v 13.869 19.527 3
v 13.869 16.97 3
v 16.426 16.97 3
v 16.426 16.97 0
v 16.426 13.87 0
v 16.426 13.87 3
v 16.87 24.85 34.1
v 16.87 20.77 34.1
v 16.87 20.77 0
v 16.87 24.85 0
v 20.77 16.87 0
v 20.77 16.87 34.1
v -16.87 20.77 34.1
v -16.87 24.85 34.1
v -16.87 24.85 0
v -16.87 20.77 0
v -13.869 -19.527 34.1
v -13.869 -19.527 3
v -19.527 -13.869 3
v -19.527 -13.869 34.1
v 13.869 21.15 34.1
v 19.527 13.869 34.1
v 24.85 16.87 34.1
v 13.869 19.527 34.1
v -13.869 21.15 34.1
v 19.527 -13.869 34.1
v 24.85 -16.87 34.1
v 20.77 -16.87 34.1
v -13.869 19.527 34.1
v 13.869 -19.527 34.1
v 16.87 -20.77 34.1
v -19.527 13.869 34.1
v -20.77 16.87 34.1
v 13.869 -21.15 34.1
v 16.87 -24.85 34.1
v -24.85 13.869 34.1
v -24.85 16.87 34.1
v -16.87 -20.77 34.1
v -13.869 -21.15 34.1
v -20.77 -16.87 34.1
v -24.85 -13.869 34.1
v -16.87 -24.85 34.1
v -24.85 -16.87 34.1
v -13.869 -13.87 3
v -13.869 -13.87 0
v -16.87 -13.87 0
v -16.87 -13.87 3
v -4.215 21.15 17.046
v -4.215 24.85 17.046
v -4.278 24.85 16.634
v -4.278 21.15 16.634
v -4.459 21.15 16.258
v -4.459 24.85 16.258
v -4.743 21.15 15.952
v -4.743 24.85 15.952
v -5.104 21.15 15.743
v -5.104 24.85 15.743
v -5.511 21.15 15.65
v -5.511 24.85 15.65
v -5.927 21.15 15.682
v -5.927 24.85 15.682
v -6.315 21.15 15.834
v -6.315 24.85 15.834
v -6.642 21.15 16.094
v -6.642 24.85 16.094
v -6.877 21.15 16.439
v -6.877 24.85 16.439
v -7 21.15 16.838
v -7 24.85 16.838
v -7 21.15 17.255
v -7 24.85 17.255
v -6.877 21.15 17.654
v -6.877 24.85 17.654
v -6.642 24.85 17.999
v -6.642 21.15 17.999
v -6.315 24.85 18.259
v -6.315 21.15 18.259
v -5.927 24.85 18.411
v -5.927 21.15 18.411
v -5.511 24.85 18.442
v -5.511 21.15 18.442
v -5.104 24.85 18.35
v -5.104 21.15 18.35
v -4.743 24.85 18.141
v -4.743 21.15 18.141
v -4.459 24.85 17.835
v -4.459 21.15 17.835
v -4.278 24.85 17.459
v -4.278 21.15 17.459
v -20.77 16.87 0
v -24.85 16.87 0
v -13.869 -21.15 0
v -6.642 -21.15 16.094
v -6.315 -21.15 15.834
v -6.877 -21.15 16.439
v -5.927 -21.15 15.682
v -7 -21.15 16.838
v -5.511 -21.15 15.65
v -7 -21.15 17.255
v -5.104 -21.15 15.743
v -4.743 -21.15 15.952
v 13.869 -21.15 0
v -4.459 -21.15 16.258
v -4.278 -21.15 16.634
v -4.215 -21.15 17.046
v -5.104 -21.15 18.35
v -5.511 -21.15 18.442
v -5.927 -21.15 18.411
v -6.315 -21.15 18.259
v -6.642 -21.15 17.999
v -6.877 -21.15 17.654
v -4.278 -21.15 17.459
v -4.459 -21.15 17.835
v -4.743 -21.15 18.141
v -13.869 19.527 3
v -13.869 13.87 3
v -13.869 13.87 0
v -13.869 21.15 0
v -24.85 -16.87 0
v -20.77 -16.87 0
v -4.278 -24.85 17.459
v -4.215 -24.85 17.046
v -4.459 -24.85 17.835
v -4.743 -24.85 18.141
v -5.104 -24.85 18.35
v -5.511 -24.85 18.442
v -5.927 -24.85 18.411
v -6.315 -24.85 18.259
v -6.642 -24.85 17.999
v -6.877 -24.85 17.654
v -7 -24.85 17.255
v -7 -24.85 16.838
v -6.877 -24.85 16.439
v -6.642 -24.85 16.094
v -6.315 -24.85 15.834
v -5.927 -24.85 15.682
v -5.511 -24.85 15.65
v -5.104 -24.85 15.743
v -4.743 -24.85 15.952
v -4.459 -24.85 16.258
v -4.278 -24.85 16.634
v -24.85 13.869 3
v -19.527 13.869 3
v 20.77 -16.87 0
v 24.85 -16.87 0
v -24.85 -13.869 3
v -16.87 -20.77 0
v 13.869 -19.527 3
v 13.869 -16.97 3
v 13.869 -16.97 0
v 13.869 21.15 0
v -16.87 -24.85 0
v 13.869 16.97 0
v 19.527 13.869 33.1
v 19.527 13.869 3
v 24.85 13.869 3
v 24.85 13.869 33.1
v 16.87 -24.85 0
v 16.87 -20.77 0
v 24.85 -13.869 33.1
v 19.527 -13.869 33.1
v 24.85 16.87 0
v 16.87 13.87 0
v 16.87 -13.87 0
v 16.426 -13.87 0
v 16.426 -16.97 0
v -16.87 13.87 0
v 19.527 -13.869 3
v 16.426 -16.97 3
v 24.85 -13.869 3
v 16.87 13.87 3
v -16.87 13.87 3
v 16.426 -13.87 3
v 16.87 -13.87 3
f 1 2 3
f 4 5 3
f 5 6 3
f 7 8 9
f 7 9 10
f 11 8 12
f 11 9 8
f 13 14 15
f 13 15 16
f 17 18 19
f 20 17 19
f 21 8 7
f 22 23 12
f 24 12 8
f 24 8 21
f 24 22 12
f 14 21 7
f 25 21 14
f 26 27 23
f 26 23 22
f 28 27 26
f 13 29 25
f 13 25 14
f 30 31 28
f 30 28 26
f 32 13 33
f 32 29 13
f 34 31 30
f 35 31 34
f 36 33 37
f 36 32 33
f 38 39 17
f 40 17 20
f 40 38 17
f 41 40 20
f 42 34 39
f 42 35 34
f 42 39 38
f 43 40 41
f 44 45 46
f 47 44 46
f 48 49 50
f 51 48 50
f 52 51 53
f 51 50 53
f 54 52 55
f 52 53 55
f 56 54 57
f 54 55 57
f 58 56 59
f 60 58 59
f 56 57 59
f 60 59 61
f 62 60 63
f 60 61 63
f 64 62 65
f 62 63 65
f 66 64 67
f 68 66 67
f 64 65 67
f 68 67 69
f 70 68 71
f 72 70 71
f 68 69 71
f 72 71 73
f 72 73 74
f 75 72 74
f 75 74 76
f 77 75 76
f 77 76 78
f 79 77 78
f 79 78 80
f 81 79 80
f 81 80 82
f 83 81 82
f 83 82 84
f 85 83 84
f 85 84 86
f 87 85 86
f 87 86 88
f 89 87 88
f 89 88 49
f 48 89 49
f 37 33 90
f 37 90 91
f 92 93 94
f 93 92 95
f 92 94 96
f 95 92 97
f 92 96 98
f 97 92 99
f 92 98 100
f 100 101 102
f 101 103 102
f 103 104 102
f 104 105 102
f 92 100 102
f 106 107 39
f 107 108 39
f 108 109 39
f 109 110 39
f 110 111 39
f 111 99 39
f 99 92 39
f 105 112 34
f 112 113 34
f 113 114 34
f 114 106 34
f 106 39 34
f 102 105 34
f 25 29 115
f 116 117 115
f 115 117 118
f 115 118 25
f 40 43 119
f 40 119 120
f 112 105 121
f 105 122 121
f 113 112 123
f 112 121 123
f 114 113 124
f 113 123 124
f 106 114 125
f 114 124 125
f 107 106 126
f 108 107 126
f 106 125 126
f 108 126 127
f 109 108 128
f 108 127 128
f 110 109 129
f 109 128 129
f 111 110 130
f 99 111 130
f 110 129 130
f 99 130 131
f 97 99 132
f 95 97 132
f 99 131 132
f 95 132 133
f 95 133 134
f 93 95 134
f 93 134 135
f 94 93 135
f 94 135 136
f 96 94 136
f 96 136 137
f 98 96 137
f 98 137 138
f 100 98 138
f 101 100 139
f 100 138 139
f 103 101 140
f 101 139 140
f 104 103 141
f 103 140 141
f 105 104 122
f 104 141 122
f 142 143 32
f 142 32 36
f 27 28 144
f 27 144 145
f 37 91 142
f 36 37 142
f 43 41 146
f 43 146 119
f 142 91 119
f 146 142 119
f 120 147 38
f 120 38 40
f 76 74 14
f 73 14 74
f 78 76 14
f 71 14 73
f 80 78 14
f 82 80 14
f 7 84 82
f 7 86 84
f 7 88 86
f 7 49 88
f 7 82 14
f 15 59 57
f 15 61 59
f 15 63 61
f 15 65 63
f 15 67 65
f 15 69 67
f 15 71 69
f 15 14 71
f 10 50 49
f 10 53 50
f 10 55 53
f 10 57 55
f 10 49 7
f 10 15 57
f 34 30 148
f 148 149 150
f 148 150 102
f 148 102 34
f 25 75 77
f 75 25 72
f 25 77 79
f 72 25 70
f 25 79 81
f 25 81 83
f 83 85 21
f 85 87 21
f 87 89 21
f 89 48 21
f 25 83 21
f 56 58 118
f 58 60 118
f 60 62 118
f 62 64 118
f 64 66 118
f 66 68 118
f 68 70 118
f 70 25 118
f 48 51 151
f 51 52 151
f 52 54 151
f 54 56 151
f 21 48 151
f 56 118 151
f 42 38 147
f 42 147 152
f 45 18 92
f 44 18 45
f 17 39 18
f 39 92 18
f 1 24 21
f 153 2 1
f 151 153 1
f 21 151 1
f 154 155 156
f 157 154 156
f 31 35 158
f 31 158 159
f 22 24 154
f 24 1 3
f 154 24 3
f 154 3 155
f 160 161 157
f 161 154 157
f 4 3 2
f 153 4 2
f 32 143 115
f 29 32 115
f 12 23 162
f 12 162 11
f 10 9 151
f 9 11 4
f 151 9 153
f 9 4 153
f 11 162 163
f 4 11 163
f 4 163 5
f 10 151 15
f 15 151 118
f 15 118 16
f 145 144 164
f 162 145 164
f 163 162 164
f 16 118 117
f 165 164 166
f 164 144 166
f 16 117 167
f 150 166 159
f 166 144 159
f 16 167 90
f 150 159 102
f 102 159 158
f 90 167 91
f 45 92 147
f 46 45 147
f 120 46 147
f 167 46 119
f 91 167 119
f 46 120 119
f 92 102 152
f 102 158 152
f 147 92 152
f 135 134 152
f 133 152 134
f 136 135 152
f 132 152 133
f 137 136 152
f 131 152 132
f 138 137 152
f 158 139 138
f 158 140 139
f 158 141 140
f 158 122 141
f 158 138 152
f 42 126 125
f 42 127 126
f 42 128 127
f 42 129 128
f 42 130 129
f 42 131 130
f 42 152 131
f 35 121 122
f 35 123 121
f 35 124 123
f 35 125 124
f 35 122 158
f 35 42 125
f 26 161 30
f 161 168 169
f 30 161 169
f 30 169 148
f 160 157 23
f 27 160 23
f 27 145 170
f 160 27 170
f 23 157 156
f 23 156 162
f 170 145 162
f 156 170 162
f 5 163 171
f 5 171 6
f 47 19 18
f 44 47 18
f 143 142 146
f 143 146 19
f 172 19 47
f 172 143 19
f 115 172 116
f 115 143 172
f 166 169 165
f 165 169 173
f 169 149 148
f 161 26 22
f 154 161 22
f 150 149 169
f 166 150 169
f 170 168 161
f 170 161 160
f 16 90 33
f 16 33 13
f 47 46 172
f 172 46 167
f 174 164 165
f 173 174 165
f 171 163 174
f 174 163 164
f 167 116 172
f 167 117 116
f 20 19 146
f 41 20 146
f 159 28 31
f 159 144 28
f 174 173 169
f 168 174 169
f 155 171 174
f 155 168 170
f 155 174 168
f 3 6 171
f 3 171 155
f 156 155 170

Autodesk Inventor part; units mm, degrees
ref_plane "Work Plane1" through (0, 0, 0) normal (0, 0, 1) x (1, 0, 0)
sketch "Sketch1" plane through (0, 0, 0) normal (0, 0, 1) x (1, 0, 0)
  arc A0 (12.5934, -5.8404) -> (12.8401, -5.9947) centre (12.8241, -5.7459) ccw construction
  line L0 (12.8401, -5.9947) -> (16.4715, -5.9947) construction
  line L1 (16.4715, -5.9947) -> (16.97, -5.4961) construction
  line L2 (16.97, -5.4961) -> (16.97, 1.583) construction
  arc A1 (16.97, 2.3806) -> (16.97, 1.583) centre (17.2691, 1.9818) ccw construction
  line L3 (16.97, 2.3806) -> (16.97, 5.4715) construction
  line L4 (16.97, 5.4715) -> (16.4715, 5.97) construction
  line L5 (16.4715, 5.97) -> (12.8401, 5.97) construction
  arc A2 (12.8401, 5.97) -> (12.6094, 5.8152) centre (12.8401, 5.7207) ccw construction
  arc A3 (12.0954, 5.2394) -> (12.6094, 5.8152) centre (11.5075, 6.2814) ccw construction
  arc A4 (12.0954, 5.2394) -> (11.974, 5.0466) centre (12.2223, 5.0248) ccw construction
  line L6 (11.974, 5.0466) -> (11.9439, 4.702) construction
  arc A5 (11.6955, 4.4744) -> (11.9439, 4.702) centre (11.6955, 4.7237) ccw construction
  line L7 (11.6955, 4.4744) -> (11.2445, 4.4744) construction
  arc A6 (10.9961, 4.702) -> (11.2445, 4.4744) centre (11.2445, 4.7237) ccw construction
  line L8 (10.9961, 4.702) -> (10.9642, 5.0674) construction
  arc A7 (10.9642, 5.0674) -> (10.8487, 5.2566) centre (10.7158, 5.0457) ccw construction
  arc A8 (10.3792, 5.8152) -> (10.8487, 5.2566) centre (11.4862, 6.2691) ccw construction
  arc A9 (10.3792, 5.8152) -> (10.1485, 5.97) centre (10.1485, 5.7206) ccw construction
  line L9 (10.1485, 5.97) -> (9.4685, 5.97) construction
  line L10 (9.4685, 5.97) -> (8.97, 5.4715) construction
  line L11 (8.97, 5.4715) -> (8.97, -5.4961) construction
  line L12 (8.97, -5.4961) -> (9.4685, -5.9947) construction
  line L13 (9.4685, -5.9947) -> (10.1412, -5.9947) construction
  arc A10 (10.1412, -5.9947) -> (10.3791, -5.84) centre (10.1485, -5.7455) ccw construction
  arc A11 (10.8487, -5.2813) -> (10.3791, -5.84) centre (11.4862, -6.2938) ccw construction
  arc A12 (10.8487, -5.2813) -> (10.9642, -5.0921) centre (10.7158, -5.0704) ccw construction
  line L14 (10.9642, -5.0921) -> (10.9961, -4.7266) construction
  arc A13 (11.2445, -4.4991) -> (10.9961, -4.7266) centre (11.2445, -4.7483) ccw construction
  line L15 (11.2445, -4.4991) -> (11.6955, -4.4991) construction
  arc A14 (11.9439, -4.7266) -> (11.6955, -4.4991) centre (11.6955, -4.7483) ccw construction
  line L16 (11.9439, -4.7266) -> (11.974, -5.0712) construction
  arc A15 (11.974, -5.0712) -> (12.0954, -5.264) centre (12.2223, -5.0495) ccw construction
  arc A16 (12.5934, -5.8404) -> (12.0954, -5.264) centre (11.4862, -6.2938) ccw construction
  arc A17 (24.85, 22.85) -> (22.85, 24.85) centre (22.85, 22.85) ccw construction
  line L17 (22.85, 24.85) -> (-16.97, 24.85) construction
  line L18 (-16.97, 24.85) -> (-16.97, 21.15) construction
  line L19 (-16.97, 21.15) -> (16.97, 21.15) construction
  line L20 (16.97, 16.97) -> (16.97, 21.15) construction
  line L21 (21.15, 16.97) -> (16.97, 16.97) construction
  line L22 (21.15, 16.97) -> (21.15, -16.97) construction
  line L23 (21.15, -16.97) -> (24.85, -16.97) construction
  line L24 (24.85, -16.97) -> (24.85, 22.85) construction
  line L25 (23.75, 23.25) -> (23.75, 18.15) construction
  arc A18 (23.25, 17.65) -> (23.75, 18.15) centre (23.25, 18.15) ccw construction
  line L26 (23.25, 17.65) -> (20.8937, 17.65) construction
  arc A19 (20.5239, 17.8134) -> (20.8937, 17.65) centre (20.8937, 18.15) ccw construction
  line L27 (20.5239, 17.8134) -> (17.7803, 20.8273) construction
  arc A20 (17.65, 21.1639) -> (17.7803, 20.8273) centre (18.15, 21.1639) ccw construction
  line L28 (17.65, 21.1639) -> (17.65, 23.25) construction
  arc A21 (18.15, 23.75) -> (17.65, 23.25) centre (18.15, 23.25) ccw construction
  line L29 (18.15, 23.75) -> (23.25, 23.75) construction
  arc A22 (23.75, 23.25) -> (23.25, 23.75) centre (23.25, 23.25) ccw construction
  arc A23 (-24.85, -22.85) -> (-22.85, -24.85) centre (-22.85, -22.85) ccw construction
  line L30 (-22.85, -24.85) -> (16.97, -24.85) construction
  line L31 (16.97, -24.85) -> (16.97, -21.15) construction
  line L32 (16.97, -21.15) -> (-16.97, -21.15) construction
  line L33 (-16.97, -16.97) -> (-16.97, -21.15) construction
  line L34 (-21.15, -16.97) -> (-16.97, -16.97) construction
  line L35 (-21.15, -16.97) -> (-21.15, 16.97) construction
  line L36 (-21.15, 16.97) -> (-24.85, 16.97) construction
  line L37 (-24.85, 16.97) -> (-24.85, -22.85) construction
  line L38 (-20.8273, -17.7803) -> (-17.8134, -20.5239) construction
  arc A24 (-17.65, -20.8937) -> (-17.8134, -20.5239) centre (-18.15, -20.8937) ccw construction
  line L39 (-17.65, -20.8937) -> (-17.65, -23.25) construction
  arc A25 (-18.15, -23.75) -> (-17.65, -23.25) centre (-18.15, -23.25) ccw construction
  line L40 (-18.15, -23.75) -> (-23.25, -23.75) construction
  arc A26 (-23.75, -23.25) -> (-23.25, -23.75) centre (-23.25, -23.25) ccw construction
  line L41 (-23.75, -23.25) -> (-23.75, -18.15) construction
  arc A27 (-23.25, -17.65) -> (-23.75, -18.15) centre (-23.25, -18.15) ccw construction
  line L42 (-23.25, -17.65) -> (-21.1639, -17.65) construction
  arc A28 (-20.8273, -17.7803) -> (-21.1639, -17.65) centre (-21.1639, -18.15) ccw construction
  arc A29 (-22.85, 24.85) -> (-24.85, 22.85) centre (-22.85, 22.85) ccw construction
  line L43 (-22.85, 24.85) -> (16.97, 24.85) construction
  line L44 (16.97, 24.85) -> (16.97, 21.15) construction
  line L45 (16.97, 21.15) -> (-16.97, 21.15) construction
  line L46 (-16.97, 16.97) -> (-16.97, 21.15) construction
  line L47 (-21.15, 16.97) -> (-16.97, 16.97) construction
  line L48 (-21.15, 16.97) -> (-21.15, -16.97) construction
  line L49 (-21.15, -16.97) -> (-24.85, -16.97) construction
  line L50 (-24.85, -16.97) -> (-24.85, 22.85) construction
  line L51 (-20.8273, 17.7803) -> (-17.8134, 20.5239) construction
  arc A30 (-17.8134, 20.5239) -> (-17.65, 20.8937) centre (-18.15, 20.8937) ccw construction
  line L52 (-17.65, 20.8937) -> (-17.65, 23.25) construction
  arc A31 (-17.65, 23.25) -> (-18.15, 23.75) centre (-18.15, 23.25) ccw construction
  line L53 (-18.15, 23.75) -> (-23.25, 23.75) construction
  arc A32 (-23.25, 23.75) -> (-23.75, 23.25) centre (-23.25, 23.25) ccw construction
  line L54 (-23.75, 23.25) -> (-23.75, 18.15) construction
  arc A33 (-23.75, 18.15) -> (-23.25, 17.65) centre (-23.25, 18.15) ccw construction
  line L55 (-23.25, 17.65) -> (-21.1639, 17.65) construction
  arc A34 (-21.1639, 17.65) -> (-20.8273, 17.7803) centre (-21.1639, 18.15) ccw construction
  arc A35 (22.85, -24.85) -> (24.85, -22.85) centre (22.85, -22.85) ccw construction
  line L56 (22.85, -24.85) -> (-16.97, -24.85) construction
  line L57 (-16.97, -24.85) -> (-16.97, -21.15) construction
  line L58 (-16.97, -21.15) -> (16.97, -21.15) construction
  line L59 (16.97, -16.97) -> (16.97, -21.15) construction
  line L60 (21.15, -16.97) -> (16.97, -16.97) construction
  line L61 (21.15, -16.97) -> (21.15, 16.97) construction
  line L62 (21.15, 16.97) -> (24.85, 16.97) construction
  line L63 (24.85, 16.97) -> (24.85, -22.85) construction
  line L64 (23.75, -23.25) -> (23.75, -18.15) construction
  arc A36 (23.75, -18.15) -> (23.25, -17.65) centre (23.25, -18.15) ccw construction
  line L65 (23.25, -17.65) -> (20.8937, -17.65) construction
  arc A37 (20.8937, -17.65) -> (20.5239, -17.8134) centre (20.8937, -18.15) ccw construction
  line L66 (20.5239, -17.8134) -> (17.7803, -20.8273) construction
  arc A38 (17.7803, -20.8273) -> (17.65, -21.1639) centre (18.15, -21.1639) ccw construction
  line L67 (17.65, -21.1639) -> (17.65, -23.25) construction
  arc A39 (17.65, -23.25) -> (18.15, -23.75) centre (18.15, -23.25) ccw construction
  line L68 (18.15, -23.75) -> (23.25, -23.75) construction
  arc A40 (23.25, -23.75) -> (23.75, -23.25) centre (23.25, -23.25) ccw construction
  circle A41 centre (0.47, -10.47) radius 1.1 construction
  circle A42 centre (0.47, 12.53) radius 1.025 construction
  line L69 (24.85, 16.87) -> (16.87, 16.87)
  line L70 (16.87, 16.87) -> (16.87, -16.87)
  line L71 (16.87, -16.87) -> (24.85, -16.87)
  line L72 (24.85, -16.87) -> (24.85, 16.87)
  line L73 (-16.87, 24.85) -> (16.87, 24.85)
  line L74 (16.87, 24.85) -> (16.87, 13.87)
  line L75 (16.87, 13.87) -> (-16.87, 13.87)
  line L76 (-16.87, 13.87) -> (-16.87, 24.85)
  line L77 (-16.87, 16.87) -> (-24.85, 16.87)
  line L78 (-24.85, 16.87) -> (-24.85, -16.87)
  line L79 (-24.85, -16.87) -> (-16.87, -16.87)
  line L80 (-16.87, -16.87) -> (-16.87, 16.87)
  line L81 (-16.87, -24.85) -> (16.87, -24.85)
  line L82 (16.87, -24.85) -> (16.87, -13.87)
  line L83 (16.87, -13.87) -> (-16.87, -13.87)
  line L84 (-16.87, -13.87) -> (-16.87, -24.85)
  point P0 (0, 0)
extrude "Extrusion1" add sketch "Sketch1" along normal blind 3 contours L72 L71 L70 L69 | L70 L75 L76 L73 L74 | L82 L81 L84 L80 L83 L70 | L80 L79 L78 L77 L76
chamfer "Chamfer1" distance 3.9 angle 45 4 edges at (16.87, -16.87, 1.5) (-16.87, -16.87, 1.5) (-16.87, 16.87, 1.5) (16.87, 16.87, 1.5)
sketch "Sketch2" plane through (0, 0, 3) normal (0, 0, 1) x (1, 0, 0)
  line L0 (-16.87, -13.87) -> (-16.87, 13.87) projected
  line L1 (-16.87, 13.87) -> (16.87, 13.87) projected
  line L2 (16.87, 13.87) -> (16.87, -13.87) projected
  line L3 (16.87, -13.87) -> (-16.87, -13.87) projected
  line L4 (-16.87, -20.77) -> (-16.87, -24.85) projected
  line L5 (-16.87, -24.85) -> (16.87, -24.85) projected
  line L6 (16.87, -24.85) -> (16.87, -20.77) projected
  line L7 (20.77, -16.87) -> (16.87, -20.77) projected
  line L8 (20.77, -16.87) -> (24.85, -16.87) projected
  line L9 (24.85, -16.87) -> (24.85, 16.87) projected
  line L10 (24.85, 16.87) -> (20.77, 16.87) projected
  line L11 (16.87, 20.77) -> (20.77, 16.87) projected
  line L12 (16.87, 20.77) -> (16.87, 24.85) projected
  line L13 (16.87, 24.85) -> (-16.87, 24.85) projected
  line L14 (-16.87, 24.85) -> (-16.87, 20.77) projected
  line L15 (-20.77, 16.87) -> (-16.87, 20.77) projected
  line L16 (-20.77, 16.87) -> (-24.85, 16.87) projected
  line L17 (-24.85, 16.87) -> (-24.85, -16.87) projected
  line L18 (-24.85, -16.87) -> (-20.77, -16.87) projected
  line L19 (-16.87, -20.77) -> (-20.77, -16.87) projected
  line L20 (13.8689, -19.5269) -> (13.8689, -21.8489)
  line L21 (-13.8689, -21.8489) -> (-13.8689, -19.5269)
  line L22 (-13.8689, -19.5269) -> (-19.5269, -13.8689)
  line L23 (-19.5269, -13.8689) -> (-21.8489, -13.8689)
  line L24 (-21.8489, 13.8689) -> (-19.5269, 13.8689)
  line L25 (-19.5269, 13.8689) -> (-13.8689, 19.5269)
  line L26 (-13.8689, 19.5269) -> (-13.8689, 21.8489)
  line L27 (13.8689, 21.8489) -> (13.8689, 19.5269)
  line L28 (13.8689, 19.5269) -> (19.5269, 13.8689)
  line L29 (19.5269, 13.8689) -> (21.8489, 13.8689)
  line L30 (21.8489, -13.8689) -> (19.5269, -13.8689)
  line L31 (19.5269, -13.8689) -> (13.8689, -19.5269)
  line L32 (13.8689, -21.8489) -> (13.8689, -24.85)
  line L33 (16.87, -24.85) -> (-16.87, -24.85) projected
  line L34 (21.8489, -13.8689) -> (24.85, -13.8689)
  line L35 (24.85, -16.87) -> (24.85, 16.87) projected
  line L36 (21.8489, 13.8689) -> (24.85, 13.8689)
  line L37 (13.8689, 21.8489) -> (13.8689, 24.85)
  line L38 (-13.8689, 21.8489) -> (-13.8689, 24.85)
  line L39 (-21.8489, 13.8689) -> (-24.85, 13.8689)
  line L40 (-21.8489, -13.8689) -> (-24.85, -13.8689)
  line L41 (-13.8689, -21.8489) -> (-13.8689, -24.85)
  line L42 (13.8689, -21.8489) -> (11.5469, -21.8489)
  line L43 (-11.5469, -21.8489) -> (-13.8689, -21.8489)
  line L44 (21.8489, 13.8689) -> (21.8489, 11.5469)
  line L45 (21.8489, -11.5469) -> (21.8489, -13.8689)
  line L46 (-21.8489, -13.8689) -> (-21.8489, -11.5469)
  line L47 (-21.8489, 11.5469) -> (-21.8489, 13.8689)
  line L48 (-13.8689, 21.8489) -> (-11.5469, 21.8489)
  line L49 (11.5469, 21.8489) -> (13.8689, 21.8489)
  point P0 (0, 0)
  dimension "d13" = 3.0011
ref_plane "Work Plane2" through (-16.97, -24.85, 34.1) normal (0, 0, -1) x (0, 1, 0)
extrude "Extrusion2" add sketch "Sketch2" along normal up to surface (31.1 mm away) contours L32 L20 L31 L30 L34 L9 L8 L7 L6 L5
pattern_circular "Circular Pattern1" count 4 over 360 about axis through (0, 0, 17.13) along (0, 0, -1) of "Extrusion2"
sketch "Sketch3" plane through (-24.85, -13.8689, 34.1) normal (0, 0, 1) x (1, 0, 0)
  circle A0 centre (13.82, 14.8989) radius 1.5 projected
  line L0 (10.9811, -5.658) -> (5.3231, 0) projected
  line L1 (5.3231, 0) -> (0, 0) projected
  line L2 (0, 0) -> (0, -3.0011) projected
  line L3 (0, -3.0011) -> (4.08, -3.0011) projected
  line L4 (4.08, -3.0011) -> (7.98, -6.9011) projected
  line L5 (7.98, -6.9011) -> (7.98, -10.9811) projected
  line L6 (7.98, -10.9811) -> (10.9811, -10.9811) projected
  line L7 (10.9811, -10.9811) -> (10.9811, -5.658) projected
  line L8 (5.3231, 27.7378) -> (10.9811, 33.3958) projected
  line L9 (10.9811, 33.3958) -> (10.9811, 38.7189) projected
  line L10 (10.9811, 38.7189) -> (7.98, 38.7189) projected
  line L11 (7.98, 38.7189) -> (7.98, 34.6389) projected
  line L12 (7.98, 34.6389) -> (4.08, 30.7389) projected
  line L13 (4.08, 30.7389) -> (0, 30.7389) projected
  line L14 (0, 30.7389) -> (0, 27.7378) projected
  line L15 (0, 27.7378) -> (5.3231, 27.7378) projected
  line L16 (10.9811, -10.9811) -> (16.9811, -10.9811)
  line L17 (16.9811, 38.7189) -> (10.9811, 38.7189)
  line L18 (0, 0) -> (0, 27.7378)
  line L19 (0, 0) -> (5.3231, 0)
  line L20 (5.3231, 0) -> (5.3231, 27.7378)
  line L21 (5.3231, 27.7378) -> (0, 27.7378)
  line L22 (0, 27.7378) -> (0, 0)
  line L23 (5.3231, 0) -> (0, 0) projected
  line L24 (5.3231, 0) -> (10.9811, -5.658)
  line L25 (10.9811, 33.3958) -> (5.3231, 27.7378)
  line L26 (38.7189, 38.7189) -> (38.7189, 33.3958) projected
  line L27 (38.7189, -5.658) -> (38.7189, -10.9811) projected
  line L28 (10.9811, -10.9811) -> (38.7189, -10.9811)
  line L29 (38.7189, -10.9811) -> (38.7189, -5.658)
  line L30 (38.7189, -5.658) -> (10.9811, -5.658)
  line L31 (10.9811, -5.658) -> (10.9811, -10.9811)
  line L32 (10.9811, 38.7189) -> (10.9811, 33.3958) projected
  line L33 (10.9811, 38.7189) -> (38.7189, 38.7189)
  line L34 (38.7189, 38.7189) -> (38.7189, 33.3958)
  line L35 (38.7189, 33.3958) -> (10.9811, 33.3958)
  line L36 (10.9811, 33.3958) -> (10.9811, 38.7189)
  line L37 (16.9811, -10.9811) -> (16.9811, -5.658)
  line L38 (16.9811, 33.3958) -> (16.9811, 38.7189)
  line L39 (10.9811, 38.7189) -> (10.9811, 33.3958)
  line L40 (10.9811, -5.658) -> (10.9811, -10.9811)
  line L41 (10.9811, -5.658) -> (10.9811, 0)
  line L42 (10.9811, 27.7378) -> (10.9811, 33.3958)
  line L43 (49.7, 0) -> (44.3769, 0) projected
  line L44 (44.3769, 27.7378) -> (49.7, 27.7378) projected
  line L45 (44.3769, 27.7378) -> (49.7, 27.7378)
  line L46 (49.7, 27.7378) -> (49.7, 0)
  line L47 (49.7, 0) -> (44.3769, 0)
  line L48 (44.3769, 0) -> (44.3769, 27.7378)
  point P0 (24.85, 13.8689)
  dimension "d19" = 6
extrude "Extrusion3" add sketch "Sketch3" against normal blind 1 contours L7 L6 L5 L4 L3 L2 L1 L0 | L15 L14 L13 L12 L11 L10 L9 L8 | L43 L48 L44 L46
sketch "Sketch4" plane through (24.85, -16.87, 0) normal (1, 0, 0) x (0, 0, -1)
  line L0 (37.9, 11.3739) -> (37.9, 18.453) construction
  line L1 (23.6194, 18.453) -> (37.9, 18.453) construction
  arc A0 (22.1806, 18.453) -> (23.6194, 18.453) centre (22.9, 16.8577) ccw construction
  line L2 (-1.3806, 18.453) -> (22.1806, 18.453) construction
  arc A1 (-2.8194, 18.453) -> (-1.3806, 18.453) centre (-2.1, 16.8577) ccw construction
  line L3 (-31.3806, 18.453) -> (-2.8194, 18.453) construction
  arc A2 (-32.8194, 18.453) -> (-31.3806, 18.453) centre (-32.1, 16.8577) ccw construction
  line L4 (-42.1, 18.453) -> (-32.8194, 18.453) construction
  line L5 (-42.1, 11.3739) -> (-42.1, 18.453) construction
  line L6 (-42.1, 11.3739) -> (37.9, 11.3739) construction
  line L7 (37.9, 19.2506) -> (37.9, 22.3415) construction
  line L8 (-42.1, 22.3415) -> (37.9, 22.3415) construction
  line L9 (-42.1, 19.2506) -> (-42.1, 22.3415) construction
  line L10 (-42.1, 19.2506) -> (37.9, 19.2506) construction
  line L11 (-3, 3.0011) -> (-3, 30.7389) construction
  line L12 (-34.1, 33.84) -> (-34.1, -5.98) construction
  line L13 (-3, 11.3739) -> (-34.1, 11.3739)
  line L14 (-34.1, 11.3739) -> (-34.1, 22.3415)
  line L15 (-34.1, 22.3415) -> (-3, 22.3415)
  line L16 (-3, 22.3415) -> (-3, 11.3739)
  line L17 (-34.1, 11.3739) -> (-32.1, 11.3739)
  line L18 (-32.1, 11.3739) -> (-32.1, 3.0011)
  line L19 (-32.1, 3.0011) -> (-34.1, 3.0011)
  line L20 (-34.1, 3.0011) -> (-34.1, 11.3739)
  line L21 (-34.1, 22.3415) -> (-32.1, 22.3415)
  line L22 (-32.1, 22.3415) -> (-32.1, 30.7389)
  line L23 (-32.1, 30.7389) -> (-34.1, 30.7389)
  line L24 (-34.1, 30.7389) -> (-34.1, 22.3415)
  point P0 (0, 16.87)
  dimension "d24" = 2
ref_plane "Work Plane3" through (16.97, -5.4961, -37.9) normal (1, 0, 0) x (0, 1, 0)
sketch "Sketch7" plane through (0, 0, 0) normal (0, 0, -1) x (-1, 0, 0)
  arc A0 (18.93, 12.43) -> (22.43, 8.93) centre (22.43, 12.43) ccw construction
  line L0 (18.93, 12.43) -> (18.93, 14.53) construction
  line L1 (3.13, 14.53) -> (18.93, 14.53) construction
  line L2 (3.13, 14.53) -> (3.13, 12.43) construction
  arc A1 (-0.37, 8.93) -> (3.13, 12.43) centre (-0.37, 12.43) ccw construction
  line L3 (-0.37, 8.93) -> (-2.47, 8.93) construction
  line L4 (-2.47, -6.87) -> (-2.47, 8.93) construction
  line L5 (-2.47, -6.87) -> (-0.37, -6.87) construction
  arc A2 (3.13, -10.37) -> (-0.37, -6.87) centre (-0.37, -10.37) ccw construction
  line L6 (3.13, -10.37) -> (3.13, -12.47) construction
  line L7 (18.93, -12.47) -> (3.13, -12.47) construction
  line L8 (18.93, -12.47) -> (18.93, -10.37) construction
  arc A3 (22.43, -6.87) -> (18.93, -10.37) centre (22.43, -10.37) ccw construction
  line L9 (22.43, -6.87) -> (24.53, -6.87) construction
  line L10 (24.53, 8.93) -> (24.53, -6.87) construction
  line L11 (24.53, 8.93) -> (22.43, 8.93) construction
  circle A4 centre (11.03, 1.03) radius 2.5 construction
  arc A5 (-1.5344, 11.2045) -> (0.934, 13.4886) centre (-0.47, 12.53) ccw construction
  circle A6 centre (-0.47, -10.47) radius 1.1 construction
  arc A7 (0.5944, 13.8555) -> (-1.874, 11.5714) centre (-0.47, 12.53) ccw construction
  line L12 (-19.5269, -13.8689) -> (-24.85, -13.8689) construction
  line L13 (-16.87, 13.87) -> (-16.87, -13.87) construction
  line L14 (-16.87, -13.87) -> (16.87, -13.87) construction
  line L15 (16.87, -13.87) -> (16.87, 13.87) construction
  line L16 (16.87, 13.87) -> (-16.87, 13.87) construction
  line L17 (-19.5269, 13.8689) -> (-13.8689, 19.5269) construction
  line L18 (-13.8689, 19.5269) -> (-13.8689, 24.85) construction
  line L19 (-13.8689, 24.85) -> (13.8689, 24.85) construction
  line L20 (13.8689, 24.85) -> (13.8689, 19.5269) construction
  line L21 (13.8689, 19.5269) -> (19.5269, 13.8689) construction
  line L22 (19.5269, 13.8689) -> (24.85, 13.8689) construction
  line L23 (24.85, 13.8689) -> (24.85, -13.8689) construction
  line L24 (24.85, -13.8689) -> (19.5269, -13.8689) construction
  line L25 (19.5269, -13.8689) -> (13.8689, -19.5269) construction
  line L26 (13.8689, -19.5269) -> (13.8689, -24.85) construction
  line L27 (13.8689, -24.85) -> (-13.8689, -24.85) construction
  line L28 (-13.8689, -24.85) -> (-13.8689, -19.5269) construction
  line L29 (-13.8689, -19.5269) -> (-19.5269, -13.8689) construction
  line L30 (16.87, 13.87) -> (-16.87, 13.87) construction
  line L31 (16.87, 13.87) -> (-19.5258, 13.87) projected
  line L32 (-2.13, 13.87) -> (16.87, 13.87)
  line L33 (16.87, 13.87) -> (16.87, -16.45)
  line L34 (16.87, -16.45) -> (-2.13, -16.45)
  line L35 (-2.13, -16.45) -> (-2.13, 13.87)
  line L36 (16.97, 16.97) -> (-16.97, 16.97)
  line L37 (16.87, 13.87) -> (-2.13, 13.87)
  line L38 (-2.13, 13.87) -> (-2.13, 16.45)
  line L39 (-2.13, 16.45) -> (16.87, 16.45)
  line L40 (16.87, 16.45) -> (16.87, 13.87)
  line L41 (-16.97, -16.97) -> (16.97, -16.97) construction
  line L42 (-24.85, -13.8689) -> (-24.85, 13.8689) projected
  line L43 (-24.85, 13.8689) -> (-19.5269, 13.8689) projected
  point P0 (0, 0)
  dimension "d35" = 19
  dimension "d36" = 0
  dimension "d74" = 16.45
  dimension "d75" = 16.45
ref_plane "Work Plane4" through (-25.03, -12.97, -12) normal (0, 0, 1) x (1, 0, 0)
sketch "Sketch14" plane through (-16.87, 24.85, 0) normal (0, 1, 0) x (1, 0, 0)
  line L0 (3.0011, -3) -> (3.0011, -34.1) projected
  line L1 (30.7389, -3) -> (3.0011, -3) projected
  line L2 (30.7389, -3) -> (30.7389, -34.1) projected
  line L3 (33.74, -34.1) -> (30.7389, -34.1) projected
  line L4 (33.74, 0) -> (33.74, -34.1) projected
  line L5 (33.74, 0) -> (0, 0) projected
  line L6 (0, 0) -> (0, -34.1) projected
  line L7 (3.0011, -34.1) -> (0, -34.1) projected
  line L8 (3.0011, -3) -> (3.0011, -34.1) projected
  line L9 (30.7389, -34.1) -> (36.3969, -34.1) projected
  line L10 (3.0011, -3) -> (30.7389, -3)
  line L11 (30.7389, -3) -> (30.7389, -34.1)
  line L12 (30.7389, -34.1) -> (3.0011, -34.1)
  line L13 (3.0011, -34.1) -> (3.0011, -3)
  circle A0 centre (11.8112, -17.0464) radius 1.4 construction
  circle A1 centre (11.2546, -17.0464) radius 1.4
  point P0 (16.87, 0)
  dimension "d89" = 2.8
extrude "Extrusion12" add sketch "Sketch14" against normal up to surface (3.7 mm away) contours L1 L2 L12 L0
sketch "Sketch15" plane through (0, 0, 3) normal (0, 0, 1) x (1, 0, 0)
  line L0 (19.5269, 13.8689) -> (13.8689, 19.5269) projected
  line L1 (2.2647, -16.97) -> (16.4258, -16.97)
  line L2 (16.4258, -16.97) -> (16.4258, 16.97)
  line L3 (16.4258, 16.97) -> (2.2647, 16.97)
  line L4 (2.2647, 16.97) -> (2.2647, -16.97)
  line L5 (2.2647, -16.97) -> (16.4258, 16.97) construction
  line L6 (16.4258, -16.97) -> (2.2647, 16.97) construction
  line L7 (13.8689, -24.85) -> (13.8689, -19.5269) projected
  line L8 (13.8689, -19.5269) -> (19.5269, -13.8689) projected
  line L9 (19.5269, -13.8689) -> (24.85, -13.8689) projected
  line L10 (24.85, -13.8689) -> (24.85, 13.8689) projected
  line L11 (16.87, 13.87) -> (16.87, -13.87) projected
  line L12 (16.87, -13.87) -> (-16.87, -13.87) projected
  line L13 (-16.87, -13.87) -> (-16.87, 13.87) projected
  line L14 (-16.87, 13.87) -> (16.87, 13.87) projected
  line L15 (24.85, 13.8689) -> (19.5269, 13.8689) projected
  line L16 (19.5269, 13.8689) -> (13.8689, 19.5269) projected
  line L17 (13.8689, 19.5269) -> (13.8689, 21.15) projected
  line L18 (-13.8689, 21.15) -> (-13.8689, 19.5269) projected
  line L19 (-13.8689, 19.5269) -> (-19.5269, 13.8689) projected
  line L20 (-19.5269, 13.8689) -> (-24.85, 13.8689) projected
  line L21 (-24.85, 13.8689) -> (-24.85, -13.8689) projected
  line L22 (-24.85, -13.8689) -> (-19.5269, -13.8689) projected
  line L23 (-19.5269, -13.8689) -> (-13.8689, -19.5269) projected
  line L24 (-13.8689, -19.5269) -> (-13.8689, -24.85) projected
  line L25 (13.8689, 19.5269) -> (13.8689, -19.5269)
  line L26 (16.87, 24.85) -> (-16.87, 24.85) projected
  line L27 (-13.8689, -19.5269) -> (-19.5269, -13.8689) projected
  line L28 (-13.8689, -19.5269) -> (-13.8689, 19.5269)
  line L29 (13.8689, 21.15) -> (-13.8689, 21.15) projected
  line L30 (-13.8689, -24.85) -> (13.8689, -24.85) projected
  point P0 (0, 0)
  point P1 (9.3452, 0)
extrude "Extrusion13" cut sketch "Sketch15" against normal through all contours L2 L14 L25 L3 | L25 L3 L4 L14 L28 L18 L29 L17 | L2 L12 L25 L14 | L25 L14 L4 L3 | L2 L1 L25 L12 | L25 L12 L4 L14 | L25 L1 L4 L12 | L4 L12 L28 L14 | L25 L7 L30 L24 L28 L12 L4 L1
sketch "Sketch16" plane through (13.8689, -24.85, 0) normal (0, -1, 0) x (1, 0, 0)
  circle A0 centre (-19.4843, 17.0464) radius 1.4 projected
  line L0 (0, 34.1) -> (-27.7378, 34.1) projected
  line L1 (-27.7378, 0) -> (-27.7378, 34.1) projected
  line L2 (0, 0) -> (-27.7378, 0) projected
  line L3 (0, 34.1) -> (0, 0) projected
  point P0 (-13.8689, 0)
extrude "Extrusion14" add sketch "Sketch16" against normal blind 3.7
equation "\"d2\" = d1"
equation "\"d3\" = d1"
equation "\"d4\" = d1"
equation "\"d5\" = d1"
equation "\"d1\" = 0.1"
properties part number "30_Cube_Z_Focus_MGN_manual_base_v3"
